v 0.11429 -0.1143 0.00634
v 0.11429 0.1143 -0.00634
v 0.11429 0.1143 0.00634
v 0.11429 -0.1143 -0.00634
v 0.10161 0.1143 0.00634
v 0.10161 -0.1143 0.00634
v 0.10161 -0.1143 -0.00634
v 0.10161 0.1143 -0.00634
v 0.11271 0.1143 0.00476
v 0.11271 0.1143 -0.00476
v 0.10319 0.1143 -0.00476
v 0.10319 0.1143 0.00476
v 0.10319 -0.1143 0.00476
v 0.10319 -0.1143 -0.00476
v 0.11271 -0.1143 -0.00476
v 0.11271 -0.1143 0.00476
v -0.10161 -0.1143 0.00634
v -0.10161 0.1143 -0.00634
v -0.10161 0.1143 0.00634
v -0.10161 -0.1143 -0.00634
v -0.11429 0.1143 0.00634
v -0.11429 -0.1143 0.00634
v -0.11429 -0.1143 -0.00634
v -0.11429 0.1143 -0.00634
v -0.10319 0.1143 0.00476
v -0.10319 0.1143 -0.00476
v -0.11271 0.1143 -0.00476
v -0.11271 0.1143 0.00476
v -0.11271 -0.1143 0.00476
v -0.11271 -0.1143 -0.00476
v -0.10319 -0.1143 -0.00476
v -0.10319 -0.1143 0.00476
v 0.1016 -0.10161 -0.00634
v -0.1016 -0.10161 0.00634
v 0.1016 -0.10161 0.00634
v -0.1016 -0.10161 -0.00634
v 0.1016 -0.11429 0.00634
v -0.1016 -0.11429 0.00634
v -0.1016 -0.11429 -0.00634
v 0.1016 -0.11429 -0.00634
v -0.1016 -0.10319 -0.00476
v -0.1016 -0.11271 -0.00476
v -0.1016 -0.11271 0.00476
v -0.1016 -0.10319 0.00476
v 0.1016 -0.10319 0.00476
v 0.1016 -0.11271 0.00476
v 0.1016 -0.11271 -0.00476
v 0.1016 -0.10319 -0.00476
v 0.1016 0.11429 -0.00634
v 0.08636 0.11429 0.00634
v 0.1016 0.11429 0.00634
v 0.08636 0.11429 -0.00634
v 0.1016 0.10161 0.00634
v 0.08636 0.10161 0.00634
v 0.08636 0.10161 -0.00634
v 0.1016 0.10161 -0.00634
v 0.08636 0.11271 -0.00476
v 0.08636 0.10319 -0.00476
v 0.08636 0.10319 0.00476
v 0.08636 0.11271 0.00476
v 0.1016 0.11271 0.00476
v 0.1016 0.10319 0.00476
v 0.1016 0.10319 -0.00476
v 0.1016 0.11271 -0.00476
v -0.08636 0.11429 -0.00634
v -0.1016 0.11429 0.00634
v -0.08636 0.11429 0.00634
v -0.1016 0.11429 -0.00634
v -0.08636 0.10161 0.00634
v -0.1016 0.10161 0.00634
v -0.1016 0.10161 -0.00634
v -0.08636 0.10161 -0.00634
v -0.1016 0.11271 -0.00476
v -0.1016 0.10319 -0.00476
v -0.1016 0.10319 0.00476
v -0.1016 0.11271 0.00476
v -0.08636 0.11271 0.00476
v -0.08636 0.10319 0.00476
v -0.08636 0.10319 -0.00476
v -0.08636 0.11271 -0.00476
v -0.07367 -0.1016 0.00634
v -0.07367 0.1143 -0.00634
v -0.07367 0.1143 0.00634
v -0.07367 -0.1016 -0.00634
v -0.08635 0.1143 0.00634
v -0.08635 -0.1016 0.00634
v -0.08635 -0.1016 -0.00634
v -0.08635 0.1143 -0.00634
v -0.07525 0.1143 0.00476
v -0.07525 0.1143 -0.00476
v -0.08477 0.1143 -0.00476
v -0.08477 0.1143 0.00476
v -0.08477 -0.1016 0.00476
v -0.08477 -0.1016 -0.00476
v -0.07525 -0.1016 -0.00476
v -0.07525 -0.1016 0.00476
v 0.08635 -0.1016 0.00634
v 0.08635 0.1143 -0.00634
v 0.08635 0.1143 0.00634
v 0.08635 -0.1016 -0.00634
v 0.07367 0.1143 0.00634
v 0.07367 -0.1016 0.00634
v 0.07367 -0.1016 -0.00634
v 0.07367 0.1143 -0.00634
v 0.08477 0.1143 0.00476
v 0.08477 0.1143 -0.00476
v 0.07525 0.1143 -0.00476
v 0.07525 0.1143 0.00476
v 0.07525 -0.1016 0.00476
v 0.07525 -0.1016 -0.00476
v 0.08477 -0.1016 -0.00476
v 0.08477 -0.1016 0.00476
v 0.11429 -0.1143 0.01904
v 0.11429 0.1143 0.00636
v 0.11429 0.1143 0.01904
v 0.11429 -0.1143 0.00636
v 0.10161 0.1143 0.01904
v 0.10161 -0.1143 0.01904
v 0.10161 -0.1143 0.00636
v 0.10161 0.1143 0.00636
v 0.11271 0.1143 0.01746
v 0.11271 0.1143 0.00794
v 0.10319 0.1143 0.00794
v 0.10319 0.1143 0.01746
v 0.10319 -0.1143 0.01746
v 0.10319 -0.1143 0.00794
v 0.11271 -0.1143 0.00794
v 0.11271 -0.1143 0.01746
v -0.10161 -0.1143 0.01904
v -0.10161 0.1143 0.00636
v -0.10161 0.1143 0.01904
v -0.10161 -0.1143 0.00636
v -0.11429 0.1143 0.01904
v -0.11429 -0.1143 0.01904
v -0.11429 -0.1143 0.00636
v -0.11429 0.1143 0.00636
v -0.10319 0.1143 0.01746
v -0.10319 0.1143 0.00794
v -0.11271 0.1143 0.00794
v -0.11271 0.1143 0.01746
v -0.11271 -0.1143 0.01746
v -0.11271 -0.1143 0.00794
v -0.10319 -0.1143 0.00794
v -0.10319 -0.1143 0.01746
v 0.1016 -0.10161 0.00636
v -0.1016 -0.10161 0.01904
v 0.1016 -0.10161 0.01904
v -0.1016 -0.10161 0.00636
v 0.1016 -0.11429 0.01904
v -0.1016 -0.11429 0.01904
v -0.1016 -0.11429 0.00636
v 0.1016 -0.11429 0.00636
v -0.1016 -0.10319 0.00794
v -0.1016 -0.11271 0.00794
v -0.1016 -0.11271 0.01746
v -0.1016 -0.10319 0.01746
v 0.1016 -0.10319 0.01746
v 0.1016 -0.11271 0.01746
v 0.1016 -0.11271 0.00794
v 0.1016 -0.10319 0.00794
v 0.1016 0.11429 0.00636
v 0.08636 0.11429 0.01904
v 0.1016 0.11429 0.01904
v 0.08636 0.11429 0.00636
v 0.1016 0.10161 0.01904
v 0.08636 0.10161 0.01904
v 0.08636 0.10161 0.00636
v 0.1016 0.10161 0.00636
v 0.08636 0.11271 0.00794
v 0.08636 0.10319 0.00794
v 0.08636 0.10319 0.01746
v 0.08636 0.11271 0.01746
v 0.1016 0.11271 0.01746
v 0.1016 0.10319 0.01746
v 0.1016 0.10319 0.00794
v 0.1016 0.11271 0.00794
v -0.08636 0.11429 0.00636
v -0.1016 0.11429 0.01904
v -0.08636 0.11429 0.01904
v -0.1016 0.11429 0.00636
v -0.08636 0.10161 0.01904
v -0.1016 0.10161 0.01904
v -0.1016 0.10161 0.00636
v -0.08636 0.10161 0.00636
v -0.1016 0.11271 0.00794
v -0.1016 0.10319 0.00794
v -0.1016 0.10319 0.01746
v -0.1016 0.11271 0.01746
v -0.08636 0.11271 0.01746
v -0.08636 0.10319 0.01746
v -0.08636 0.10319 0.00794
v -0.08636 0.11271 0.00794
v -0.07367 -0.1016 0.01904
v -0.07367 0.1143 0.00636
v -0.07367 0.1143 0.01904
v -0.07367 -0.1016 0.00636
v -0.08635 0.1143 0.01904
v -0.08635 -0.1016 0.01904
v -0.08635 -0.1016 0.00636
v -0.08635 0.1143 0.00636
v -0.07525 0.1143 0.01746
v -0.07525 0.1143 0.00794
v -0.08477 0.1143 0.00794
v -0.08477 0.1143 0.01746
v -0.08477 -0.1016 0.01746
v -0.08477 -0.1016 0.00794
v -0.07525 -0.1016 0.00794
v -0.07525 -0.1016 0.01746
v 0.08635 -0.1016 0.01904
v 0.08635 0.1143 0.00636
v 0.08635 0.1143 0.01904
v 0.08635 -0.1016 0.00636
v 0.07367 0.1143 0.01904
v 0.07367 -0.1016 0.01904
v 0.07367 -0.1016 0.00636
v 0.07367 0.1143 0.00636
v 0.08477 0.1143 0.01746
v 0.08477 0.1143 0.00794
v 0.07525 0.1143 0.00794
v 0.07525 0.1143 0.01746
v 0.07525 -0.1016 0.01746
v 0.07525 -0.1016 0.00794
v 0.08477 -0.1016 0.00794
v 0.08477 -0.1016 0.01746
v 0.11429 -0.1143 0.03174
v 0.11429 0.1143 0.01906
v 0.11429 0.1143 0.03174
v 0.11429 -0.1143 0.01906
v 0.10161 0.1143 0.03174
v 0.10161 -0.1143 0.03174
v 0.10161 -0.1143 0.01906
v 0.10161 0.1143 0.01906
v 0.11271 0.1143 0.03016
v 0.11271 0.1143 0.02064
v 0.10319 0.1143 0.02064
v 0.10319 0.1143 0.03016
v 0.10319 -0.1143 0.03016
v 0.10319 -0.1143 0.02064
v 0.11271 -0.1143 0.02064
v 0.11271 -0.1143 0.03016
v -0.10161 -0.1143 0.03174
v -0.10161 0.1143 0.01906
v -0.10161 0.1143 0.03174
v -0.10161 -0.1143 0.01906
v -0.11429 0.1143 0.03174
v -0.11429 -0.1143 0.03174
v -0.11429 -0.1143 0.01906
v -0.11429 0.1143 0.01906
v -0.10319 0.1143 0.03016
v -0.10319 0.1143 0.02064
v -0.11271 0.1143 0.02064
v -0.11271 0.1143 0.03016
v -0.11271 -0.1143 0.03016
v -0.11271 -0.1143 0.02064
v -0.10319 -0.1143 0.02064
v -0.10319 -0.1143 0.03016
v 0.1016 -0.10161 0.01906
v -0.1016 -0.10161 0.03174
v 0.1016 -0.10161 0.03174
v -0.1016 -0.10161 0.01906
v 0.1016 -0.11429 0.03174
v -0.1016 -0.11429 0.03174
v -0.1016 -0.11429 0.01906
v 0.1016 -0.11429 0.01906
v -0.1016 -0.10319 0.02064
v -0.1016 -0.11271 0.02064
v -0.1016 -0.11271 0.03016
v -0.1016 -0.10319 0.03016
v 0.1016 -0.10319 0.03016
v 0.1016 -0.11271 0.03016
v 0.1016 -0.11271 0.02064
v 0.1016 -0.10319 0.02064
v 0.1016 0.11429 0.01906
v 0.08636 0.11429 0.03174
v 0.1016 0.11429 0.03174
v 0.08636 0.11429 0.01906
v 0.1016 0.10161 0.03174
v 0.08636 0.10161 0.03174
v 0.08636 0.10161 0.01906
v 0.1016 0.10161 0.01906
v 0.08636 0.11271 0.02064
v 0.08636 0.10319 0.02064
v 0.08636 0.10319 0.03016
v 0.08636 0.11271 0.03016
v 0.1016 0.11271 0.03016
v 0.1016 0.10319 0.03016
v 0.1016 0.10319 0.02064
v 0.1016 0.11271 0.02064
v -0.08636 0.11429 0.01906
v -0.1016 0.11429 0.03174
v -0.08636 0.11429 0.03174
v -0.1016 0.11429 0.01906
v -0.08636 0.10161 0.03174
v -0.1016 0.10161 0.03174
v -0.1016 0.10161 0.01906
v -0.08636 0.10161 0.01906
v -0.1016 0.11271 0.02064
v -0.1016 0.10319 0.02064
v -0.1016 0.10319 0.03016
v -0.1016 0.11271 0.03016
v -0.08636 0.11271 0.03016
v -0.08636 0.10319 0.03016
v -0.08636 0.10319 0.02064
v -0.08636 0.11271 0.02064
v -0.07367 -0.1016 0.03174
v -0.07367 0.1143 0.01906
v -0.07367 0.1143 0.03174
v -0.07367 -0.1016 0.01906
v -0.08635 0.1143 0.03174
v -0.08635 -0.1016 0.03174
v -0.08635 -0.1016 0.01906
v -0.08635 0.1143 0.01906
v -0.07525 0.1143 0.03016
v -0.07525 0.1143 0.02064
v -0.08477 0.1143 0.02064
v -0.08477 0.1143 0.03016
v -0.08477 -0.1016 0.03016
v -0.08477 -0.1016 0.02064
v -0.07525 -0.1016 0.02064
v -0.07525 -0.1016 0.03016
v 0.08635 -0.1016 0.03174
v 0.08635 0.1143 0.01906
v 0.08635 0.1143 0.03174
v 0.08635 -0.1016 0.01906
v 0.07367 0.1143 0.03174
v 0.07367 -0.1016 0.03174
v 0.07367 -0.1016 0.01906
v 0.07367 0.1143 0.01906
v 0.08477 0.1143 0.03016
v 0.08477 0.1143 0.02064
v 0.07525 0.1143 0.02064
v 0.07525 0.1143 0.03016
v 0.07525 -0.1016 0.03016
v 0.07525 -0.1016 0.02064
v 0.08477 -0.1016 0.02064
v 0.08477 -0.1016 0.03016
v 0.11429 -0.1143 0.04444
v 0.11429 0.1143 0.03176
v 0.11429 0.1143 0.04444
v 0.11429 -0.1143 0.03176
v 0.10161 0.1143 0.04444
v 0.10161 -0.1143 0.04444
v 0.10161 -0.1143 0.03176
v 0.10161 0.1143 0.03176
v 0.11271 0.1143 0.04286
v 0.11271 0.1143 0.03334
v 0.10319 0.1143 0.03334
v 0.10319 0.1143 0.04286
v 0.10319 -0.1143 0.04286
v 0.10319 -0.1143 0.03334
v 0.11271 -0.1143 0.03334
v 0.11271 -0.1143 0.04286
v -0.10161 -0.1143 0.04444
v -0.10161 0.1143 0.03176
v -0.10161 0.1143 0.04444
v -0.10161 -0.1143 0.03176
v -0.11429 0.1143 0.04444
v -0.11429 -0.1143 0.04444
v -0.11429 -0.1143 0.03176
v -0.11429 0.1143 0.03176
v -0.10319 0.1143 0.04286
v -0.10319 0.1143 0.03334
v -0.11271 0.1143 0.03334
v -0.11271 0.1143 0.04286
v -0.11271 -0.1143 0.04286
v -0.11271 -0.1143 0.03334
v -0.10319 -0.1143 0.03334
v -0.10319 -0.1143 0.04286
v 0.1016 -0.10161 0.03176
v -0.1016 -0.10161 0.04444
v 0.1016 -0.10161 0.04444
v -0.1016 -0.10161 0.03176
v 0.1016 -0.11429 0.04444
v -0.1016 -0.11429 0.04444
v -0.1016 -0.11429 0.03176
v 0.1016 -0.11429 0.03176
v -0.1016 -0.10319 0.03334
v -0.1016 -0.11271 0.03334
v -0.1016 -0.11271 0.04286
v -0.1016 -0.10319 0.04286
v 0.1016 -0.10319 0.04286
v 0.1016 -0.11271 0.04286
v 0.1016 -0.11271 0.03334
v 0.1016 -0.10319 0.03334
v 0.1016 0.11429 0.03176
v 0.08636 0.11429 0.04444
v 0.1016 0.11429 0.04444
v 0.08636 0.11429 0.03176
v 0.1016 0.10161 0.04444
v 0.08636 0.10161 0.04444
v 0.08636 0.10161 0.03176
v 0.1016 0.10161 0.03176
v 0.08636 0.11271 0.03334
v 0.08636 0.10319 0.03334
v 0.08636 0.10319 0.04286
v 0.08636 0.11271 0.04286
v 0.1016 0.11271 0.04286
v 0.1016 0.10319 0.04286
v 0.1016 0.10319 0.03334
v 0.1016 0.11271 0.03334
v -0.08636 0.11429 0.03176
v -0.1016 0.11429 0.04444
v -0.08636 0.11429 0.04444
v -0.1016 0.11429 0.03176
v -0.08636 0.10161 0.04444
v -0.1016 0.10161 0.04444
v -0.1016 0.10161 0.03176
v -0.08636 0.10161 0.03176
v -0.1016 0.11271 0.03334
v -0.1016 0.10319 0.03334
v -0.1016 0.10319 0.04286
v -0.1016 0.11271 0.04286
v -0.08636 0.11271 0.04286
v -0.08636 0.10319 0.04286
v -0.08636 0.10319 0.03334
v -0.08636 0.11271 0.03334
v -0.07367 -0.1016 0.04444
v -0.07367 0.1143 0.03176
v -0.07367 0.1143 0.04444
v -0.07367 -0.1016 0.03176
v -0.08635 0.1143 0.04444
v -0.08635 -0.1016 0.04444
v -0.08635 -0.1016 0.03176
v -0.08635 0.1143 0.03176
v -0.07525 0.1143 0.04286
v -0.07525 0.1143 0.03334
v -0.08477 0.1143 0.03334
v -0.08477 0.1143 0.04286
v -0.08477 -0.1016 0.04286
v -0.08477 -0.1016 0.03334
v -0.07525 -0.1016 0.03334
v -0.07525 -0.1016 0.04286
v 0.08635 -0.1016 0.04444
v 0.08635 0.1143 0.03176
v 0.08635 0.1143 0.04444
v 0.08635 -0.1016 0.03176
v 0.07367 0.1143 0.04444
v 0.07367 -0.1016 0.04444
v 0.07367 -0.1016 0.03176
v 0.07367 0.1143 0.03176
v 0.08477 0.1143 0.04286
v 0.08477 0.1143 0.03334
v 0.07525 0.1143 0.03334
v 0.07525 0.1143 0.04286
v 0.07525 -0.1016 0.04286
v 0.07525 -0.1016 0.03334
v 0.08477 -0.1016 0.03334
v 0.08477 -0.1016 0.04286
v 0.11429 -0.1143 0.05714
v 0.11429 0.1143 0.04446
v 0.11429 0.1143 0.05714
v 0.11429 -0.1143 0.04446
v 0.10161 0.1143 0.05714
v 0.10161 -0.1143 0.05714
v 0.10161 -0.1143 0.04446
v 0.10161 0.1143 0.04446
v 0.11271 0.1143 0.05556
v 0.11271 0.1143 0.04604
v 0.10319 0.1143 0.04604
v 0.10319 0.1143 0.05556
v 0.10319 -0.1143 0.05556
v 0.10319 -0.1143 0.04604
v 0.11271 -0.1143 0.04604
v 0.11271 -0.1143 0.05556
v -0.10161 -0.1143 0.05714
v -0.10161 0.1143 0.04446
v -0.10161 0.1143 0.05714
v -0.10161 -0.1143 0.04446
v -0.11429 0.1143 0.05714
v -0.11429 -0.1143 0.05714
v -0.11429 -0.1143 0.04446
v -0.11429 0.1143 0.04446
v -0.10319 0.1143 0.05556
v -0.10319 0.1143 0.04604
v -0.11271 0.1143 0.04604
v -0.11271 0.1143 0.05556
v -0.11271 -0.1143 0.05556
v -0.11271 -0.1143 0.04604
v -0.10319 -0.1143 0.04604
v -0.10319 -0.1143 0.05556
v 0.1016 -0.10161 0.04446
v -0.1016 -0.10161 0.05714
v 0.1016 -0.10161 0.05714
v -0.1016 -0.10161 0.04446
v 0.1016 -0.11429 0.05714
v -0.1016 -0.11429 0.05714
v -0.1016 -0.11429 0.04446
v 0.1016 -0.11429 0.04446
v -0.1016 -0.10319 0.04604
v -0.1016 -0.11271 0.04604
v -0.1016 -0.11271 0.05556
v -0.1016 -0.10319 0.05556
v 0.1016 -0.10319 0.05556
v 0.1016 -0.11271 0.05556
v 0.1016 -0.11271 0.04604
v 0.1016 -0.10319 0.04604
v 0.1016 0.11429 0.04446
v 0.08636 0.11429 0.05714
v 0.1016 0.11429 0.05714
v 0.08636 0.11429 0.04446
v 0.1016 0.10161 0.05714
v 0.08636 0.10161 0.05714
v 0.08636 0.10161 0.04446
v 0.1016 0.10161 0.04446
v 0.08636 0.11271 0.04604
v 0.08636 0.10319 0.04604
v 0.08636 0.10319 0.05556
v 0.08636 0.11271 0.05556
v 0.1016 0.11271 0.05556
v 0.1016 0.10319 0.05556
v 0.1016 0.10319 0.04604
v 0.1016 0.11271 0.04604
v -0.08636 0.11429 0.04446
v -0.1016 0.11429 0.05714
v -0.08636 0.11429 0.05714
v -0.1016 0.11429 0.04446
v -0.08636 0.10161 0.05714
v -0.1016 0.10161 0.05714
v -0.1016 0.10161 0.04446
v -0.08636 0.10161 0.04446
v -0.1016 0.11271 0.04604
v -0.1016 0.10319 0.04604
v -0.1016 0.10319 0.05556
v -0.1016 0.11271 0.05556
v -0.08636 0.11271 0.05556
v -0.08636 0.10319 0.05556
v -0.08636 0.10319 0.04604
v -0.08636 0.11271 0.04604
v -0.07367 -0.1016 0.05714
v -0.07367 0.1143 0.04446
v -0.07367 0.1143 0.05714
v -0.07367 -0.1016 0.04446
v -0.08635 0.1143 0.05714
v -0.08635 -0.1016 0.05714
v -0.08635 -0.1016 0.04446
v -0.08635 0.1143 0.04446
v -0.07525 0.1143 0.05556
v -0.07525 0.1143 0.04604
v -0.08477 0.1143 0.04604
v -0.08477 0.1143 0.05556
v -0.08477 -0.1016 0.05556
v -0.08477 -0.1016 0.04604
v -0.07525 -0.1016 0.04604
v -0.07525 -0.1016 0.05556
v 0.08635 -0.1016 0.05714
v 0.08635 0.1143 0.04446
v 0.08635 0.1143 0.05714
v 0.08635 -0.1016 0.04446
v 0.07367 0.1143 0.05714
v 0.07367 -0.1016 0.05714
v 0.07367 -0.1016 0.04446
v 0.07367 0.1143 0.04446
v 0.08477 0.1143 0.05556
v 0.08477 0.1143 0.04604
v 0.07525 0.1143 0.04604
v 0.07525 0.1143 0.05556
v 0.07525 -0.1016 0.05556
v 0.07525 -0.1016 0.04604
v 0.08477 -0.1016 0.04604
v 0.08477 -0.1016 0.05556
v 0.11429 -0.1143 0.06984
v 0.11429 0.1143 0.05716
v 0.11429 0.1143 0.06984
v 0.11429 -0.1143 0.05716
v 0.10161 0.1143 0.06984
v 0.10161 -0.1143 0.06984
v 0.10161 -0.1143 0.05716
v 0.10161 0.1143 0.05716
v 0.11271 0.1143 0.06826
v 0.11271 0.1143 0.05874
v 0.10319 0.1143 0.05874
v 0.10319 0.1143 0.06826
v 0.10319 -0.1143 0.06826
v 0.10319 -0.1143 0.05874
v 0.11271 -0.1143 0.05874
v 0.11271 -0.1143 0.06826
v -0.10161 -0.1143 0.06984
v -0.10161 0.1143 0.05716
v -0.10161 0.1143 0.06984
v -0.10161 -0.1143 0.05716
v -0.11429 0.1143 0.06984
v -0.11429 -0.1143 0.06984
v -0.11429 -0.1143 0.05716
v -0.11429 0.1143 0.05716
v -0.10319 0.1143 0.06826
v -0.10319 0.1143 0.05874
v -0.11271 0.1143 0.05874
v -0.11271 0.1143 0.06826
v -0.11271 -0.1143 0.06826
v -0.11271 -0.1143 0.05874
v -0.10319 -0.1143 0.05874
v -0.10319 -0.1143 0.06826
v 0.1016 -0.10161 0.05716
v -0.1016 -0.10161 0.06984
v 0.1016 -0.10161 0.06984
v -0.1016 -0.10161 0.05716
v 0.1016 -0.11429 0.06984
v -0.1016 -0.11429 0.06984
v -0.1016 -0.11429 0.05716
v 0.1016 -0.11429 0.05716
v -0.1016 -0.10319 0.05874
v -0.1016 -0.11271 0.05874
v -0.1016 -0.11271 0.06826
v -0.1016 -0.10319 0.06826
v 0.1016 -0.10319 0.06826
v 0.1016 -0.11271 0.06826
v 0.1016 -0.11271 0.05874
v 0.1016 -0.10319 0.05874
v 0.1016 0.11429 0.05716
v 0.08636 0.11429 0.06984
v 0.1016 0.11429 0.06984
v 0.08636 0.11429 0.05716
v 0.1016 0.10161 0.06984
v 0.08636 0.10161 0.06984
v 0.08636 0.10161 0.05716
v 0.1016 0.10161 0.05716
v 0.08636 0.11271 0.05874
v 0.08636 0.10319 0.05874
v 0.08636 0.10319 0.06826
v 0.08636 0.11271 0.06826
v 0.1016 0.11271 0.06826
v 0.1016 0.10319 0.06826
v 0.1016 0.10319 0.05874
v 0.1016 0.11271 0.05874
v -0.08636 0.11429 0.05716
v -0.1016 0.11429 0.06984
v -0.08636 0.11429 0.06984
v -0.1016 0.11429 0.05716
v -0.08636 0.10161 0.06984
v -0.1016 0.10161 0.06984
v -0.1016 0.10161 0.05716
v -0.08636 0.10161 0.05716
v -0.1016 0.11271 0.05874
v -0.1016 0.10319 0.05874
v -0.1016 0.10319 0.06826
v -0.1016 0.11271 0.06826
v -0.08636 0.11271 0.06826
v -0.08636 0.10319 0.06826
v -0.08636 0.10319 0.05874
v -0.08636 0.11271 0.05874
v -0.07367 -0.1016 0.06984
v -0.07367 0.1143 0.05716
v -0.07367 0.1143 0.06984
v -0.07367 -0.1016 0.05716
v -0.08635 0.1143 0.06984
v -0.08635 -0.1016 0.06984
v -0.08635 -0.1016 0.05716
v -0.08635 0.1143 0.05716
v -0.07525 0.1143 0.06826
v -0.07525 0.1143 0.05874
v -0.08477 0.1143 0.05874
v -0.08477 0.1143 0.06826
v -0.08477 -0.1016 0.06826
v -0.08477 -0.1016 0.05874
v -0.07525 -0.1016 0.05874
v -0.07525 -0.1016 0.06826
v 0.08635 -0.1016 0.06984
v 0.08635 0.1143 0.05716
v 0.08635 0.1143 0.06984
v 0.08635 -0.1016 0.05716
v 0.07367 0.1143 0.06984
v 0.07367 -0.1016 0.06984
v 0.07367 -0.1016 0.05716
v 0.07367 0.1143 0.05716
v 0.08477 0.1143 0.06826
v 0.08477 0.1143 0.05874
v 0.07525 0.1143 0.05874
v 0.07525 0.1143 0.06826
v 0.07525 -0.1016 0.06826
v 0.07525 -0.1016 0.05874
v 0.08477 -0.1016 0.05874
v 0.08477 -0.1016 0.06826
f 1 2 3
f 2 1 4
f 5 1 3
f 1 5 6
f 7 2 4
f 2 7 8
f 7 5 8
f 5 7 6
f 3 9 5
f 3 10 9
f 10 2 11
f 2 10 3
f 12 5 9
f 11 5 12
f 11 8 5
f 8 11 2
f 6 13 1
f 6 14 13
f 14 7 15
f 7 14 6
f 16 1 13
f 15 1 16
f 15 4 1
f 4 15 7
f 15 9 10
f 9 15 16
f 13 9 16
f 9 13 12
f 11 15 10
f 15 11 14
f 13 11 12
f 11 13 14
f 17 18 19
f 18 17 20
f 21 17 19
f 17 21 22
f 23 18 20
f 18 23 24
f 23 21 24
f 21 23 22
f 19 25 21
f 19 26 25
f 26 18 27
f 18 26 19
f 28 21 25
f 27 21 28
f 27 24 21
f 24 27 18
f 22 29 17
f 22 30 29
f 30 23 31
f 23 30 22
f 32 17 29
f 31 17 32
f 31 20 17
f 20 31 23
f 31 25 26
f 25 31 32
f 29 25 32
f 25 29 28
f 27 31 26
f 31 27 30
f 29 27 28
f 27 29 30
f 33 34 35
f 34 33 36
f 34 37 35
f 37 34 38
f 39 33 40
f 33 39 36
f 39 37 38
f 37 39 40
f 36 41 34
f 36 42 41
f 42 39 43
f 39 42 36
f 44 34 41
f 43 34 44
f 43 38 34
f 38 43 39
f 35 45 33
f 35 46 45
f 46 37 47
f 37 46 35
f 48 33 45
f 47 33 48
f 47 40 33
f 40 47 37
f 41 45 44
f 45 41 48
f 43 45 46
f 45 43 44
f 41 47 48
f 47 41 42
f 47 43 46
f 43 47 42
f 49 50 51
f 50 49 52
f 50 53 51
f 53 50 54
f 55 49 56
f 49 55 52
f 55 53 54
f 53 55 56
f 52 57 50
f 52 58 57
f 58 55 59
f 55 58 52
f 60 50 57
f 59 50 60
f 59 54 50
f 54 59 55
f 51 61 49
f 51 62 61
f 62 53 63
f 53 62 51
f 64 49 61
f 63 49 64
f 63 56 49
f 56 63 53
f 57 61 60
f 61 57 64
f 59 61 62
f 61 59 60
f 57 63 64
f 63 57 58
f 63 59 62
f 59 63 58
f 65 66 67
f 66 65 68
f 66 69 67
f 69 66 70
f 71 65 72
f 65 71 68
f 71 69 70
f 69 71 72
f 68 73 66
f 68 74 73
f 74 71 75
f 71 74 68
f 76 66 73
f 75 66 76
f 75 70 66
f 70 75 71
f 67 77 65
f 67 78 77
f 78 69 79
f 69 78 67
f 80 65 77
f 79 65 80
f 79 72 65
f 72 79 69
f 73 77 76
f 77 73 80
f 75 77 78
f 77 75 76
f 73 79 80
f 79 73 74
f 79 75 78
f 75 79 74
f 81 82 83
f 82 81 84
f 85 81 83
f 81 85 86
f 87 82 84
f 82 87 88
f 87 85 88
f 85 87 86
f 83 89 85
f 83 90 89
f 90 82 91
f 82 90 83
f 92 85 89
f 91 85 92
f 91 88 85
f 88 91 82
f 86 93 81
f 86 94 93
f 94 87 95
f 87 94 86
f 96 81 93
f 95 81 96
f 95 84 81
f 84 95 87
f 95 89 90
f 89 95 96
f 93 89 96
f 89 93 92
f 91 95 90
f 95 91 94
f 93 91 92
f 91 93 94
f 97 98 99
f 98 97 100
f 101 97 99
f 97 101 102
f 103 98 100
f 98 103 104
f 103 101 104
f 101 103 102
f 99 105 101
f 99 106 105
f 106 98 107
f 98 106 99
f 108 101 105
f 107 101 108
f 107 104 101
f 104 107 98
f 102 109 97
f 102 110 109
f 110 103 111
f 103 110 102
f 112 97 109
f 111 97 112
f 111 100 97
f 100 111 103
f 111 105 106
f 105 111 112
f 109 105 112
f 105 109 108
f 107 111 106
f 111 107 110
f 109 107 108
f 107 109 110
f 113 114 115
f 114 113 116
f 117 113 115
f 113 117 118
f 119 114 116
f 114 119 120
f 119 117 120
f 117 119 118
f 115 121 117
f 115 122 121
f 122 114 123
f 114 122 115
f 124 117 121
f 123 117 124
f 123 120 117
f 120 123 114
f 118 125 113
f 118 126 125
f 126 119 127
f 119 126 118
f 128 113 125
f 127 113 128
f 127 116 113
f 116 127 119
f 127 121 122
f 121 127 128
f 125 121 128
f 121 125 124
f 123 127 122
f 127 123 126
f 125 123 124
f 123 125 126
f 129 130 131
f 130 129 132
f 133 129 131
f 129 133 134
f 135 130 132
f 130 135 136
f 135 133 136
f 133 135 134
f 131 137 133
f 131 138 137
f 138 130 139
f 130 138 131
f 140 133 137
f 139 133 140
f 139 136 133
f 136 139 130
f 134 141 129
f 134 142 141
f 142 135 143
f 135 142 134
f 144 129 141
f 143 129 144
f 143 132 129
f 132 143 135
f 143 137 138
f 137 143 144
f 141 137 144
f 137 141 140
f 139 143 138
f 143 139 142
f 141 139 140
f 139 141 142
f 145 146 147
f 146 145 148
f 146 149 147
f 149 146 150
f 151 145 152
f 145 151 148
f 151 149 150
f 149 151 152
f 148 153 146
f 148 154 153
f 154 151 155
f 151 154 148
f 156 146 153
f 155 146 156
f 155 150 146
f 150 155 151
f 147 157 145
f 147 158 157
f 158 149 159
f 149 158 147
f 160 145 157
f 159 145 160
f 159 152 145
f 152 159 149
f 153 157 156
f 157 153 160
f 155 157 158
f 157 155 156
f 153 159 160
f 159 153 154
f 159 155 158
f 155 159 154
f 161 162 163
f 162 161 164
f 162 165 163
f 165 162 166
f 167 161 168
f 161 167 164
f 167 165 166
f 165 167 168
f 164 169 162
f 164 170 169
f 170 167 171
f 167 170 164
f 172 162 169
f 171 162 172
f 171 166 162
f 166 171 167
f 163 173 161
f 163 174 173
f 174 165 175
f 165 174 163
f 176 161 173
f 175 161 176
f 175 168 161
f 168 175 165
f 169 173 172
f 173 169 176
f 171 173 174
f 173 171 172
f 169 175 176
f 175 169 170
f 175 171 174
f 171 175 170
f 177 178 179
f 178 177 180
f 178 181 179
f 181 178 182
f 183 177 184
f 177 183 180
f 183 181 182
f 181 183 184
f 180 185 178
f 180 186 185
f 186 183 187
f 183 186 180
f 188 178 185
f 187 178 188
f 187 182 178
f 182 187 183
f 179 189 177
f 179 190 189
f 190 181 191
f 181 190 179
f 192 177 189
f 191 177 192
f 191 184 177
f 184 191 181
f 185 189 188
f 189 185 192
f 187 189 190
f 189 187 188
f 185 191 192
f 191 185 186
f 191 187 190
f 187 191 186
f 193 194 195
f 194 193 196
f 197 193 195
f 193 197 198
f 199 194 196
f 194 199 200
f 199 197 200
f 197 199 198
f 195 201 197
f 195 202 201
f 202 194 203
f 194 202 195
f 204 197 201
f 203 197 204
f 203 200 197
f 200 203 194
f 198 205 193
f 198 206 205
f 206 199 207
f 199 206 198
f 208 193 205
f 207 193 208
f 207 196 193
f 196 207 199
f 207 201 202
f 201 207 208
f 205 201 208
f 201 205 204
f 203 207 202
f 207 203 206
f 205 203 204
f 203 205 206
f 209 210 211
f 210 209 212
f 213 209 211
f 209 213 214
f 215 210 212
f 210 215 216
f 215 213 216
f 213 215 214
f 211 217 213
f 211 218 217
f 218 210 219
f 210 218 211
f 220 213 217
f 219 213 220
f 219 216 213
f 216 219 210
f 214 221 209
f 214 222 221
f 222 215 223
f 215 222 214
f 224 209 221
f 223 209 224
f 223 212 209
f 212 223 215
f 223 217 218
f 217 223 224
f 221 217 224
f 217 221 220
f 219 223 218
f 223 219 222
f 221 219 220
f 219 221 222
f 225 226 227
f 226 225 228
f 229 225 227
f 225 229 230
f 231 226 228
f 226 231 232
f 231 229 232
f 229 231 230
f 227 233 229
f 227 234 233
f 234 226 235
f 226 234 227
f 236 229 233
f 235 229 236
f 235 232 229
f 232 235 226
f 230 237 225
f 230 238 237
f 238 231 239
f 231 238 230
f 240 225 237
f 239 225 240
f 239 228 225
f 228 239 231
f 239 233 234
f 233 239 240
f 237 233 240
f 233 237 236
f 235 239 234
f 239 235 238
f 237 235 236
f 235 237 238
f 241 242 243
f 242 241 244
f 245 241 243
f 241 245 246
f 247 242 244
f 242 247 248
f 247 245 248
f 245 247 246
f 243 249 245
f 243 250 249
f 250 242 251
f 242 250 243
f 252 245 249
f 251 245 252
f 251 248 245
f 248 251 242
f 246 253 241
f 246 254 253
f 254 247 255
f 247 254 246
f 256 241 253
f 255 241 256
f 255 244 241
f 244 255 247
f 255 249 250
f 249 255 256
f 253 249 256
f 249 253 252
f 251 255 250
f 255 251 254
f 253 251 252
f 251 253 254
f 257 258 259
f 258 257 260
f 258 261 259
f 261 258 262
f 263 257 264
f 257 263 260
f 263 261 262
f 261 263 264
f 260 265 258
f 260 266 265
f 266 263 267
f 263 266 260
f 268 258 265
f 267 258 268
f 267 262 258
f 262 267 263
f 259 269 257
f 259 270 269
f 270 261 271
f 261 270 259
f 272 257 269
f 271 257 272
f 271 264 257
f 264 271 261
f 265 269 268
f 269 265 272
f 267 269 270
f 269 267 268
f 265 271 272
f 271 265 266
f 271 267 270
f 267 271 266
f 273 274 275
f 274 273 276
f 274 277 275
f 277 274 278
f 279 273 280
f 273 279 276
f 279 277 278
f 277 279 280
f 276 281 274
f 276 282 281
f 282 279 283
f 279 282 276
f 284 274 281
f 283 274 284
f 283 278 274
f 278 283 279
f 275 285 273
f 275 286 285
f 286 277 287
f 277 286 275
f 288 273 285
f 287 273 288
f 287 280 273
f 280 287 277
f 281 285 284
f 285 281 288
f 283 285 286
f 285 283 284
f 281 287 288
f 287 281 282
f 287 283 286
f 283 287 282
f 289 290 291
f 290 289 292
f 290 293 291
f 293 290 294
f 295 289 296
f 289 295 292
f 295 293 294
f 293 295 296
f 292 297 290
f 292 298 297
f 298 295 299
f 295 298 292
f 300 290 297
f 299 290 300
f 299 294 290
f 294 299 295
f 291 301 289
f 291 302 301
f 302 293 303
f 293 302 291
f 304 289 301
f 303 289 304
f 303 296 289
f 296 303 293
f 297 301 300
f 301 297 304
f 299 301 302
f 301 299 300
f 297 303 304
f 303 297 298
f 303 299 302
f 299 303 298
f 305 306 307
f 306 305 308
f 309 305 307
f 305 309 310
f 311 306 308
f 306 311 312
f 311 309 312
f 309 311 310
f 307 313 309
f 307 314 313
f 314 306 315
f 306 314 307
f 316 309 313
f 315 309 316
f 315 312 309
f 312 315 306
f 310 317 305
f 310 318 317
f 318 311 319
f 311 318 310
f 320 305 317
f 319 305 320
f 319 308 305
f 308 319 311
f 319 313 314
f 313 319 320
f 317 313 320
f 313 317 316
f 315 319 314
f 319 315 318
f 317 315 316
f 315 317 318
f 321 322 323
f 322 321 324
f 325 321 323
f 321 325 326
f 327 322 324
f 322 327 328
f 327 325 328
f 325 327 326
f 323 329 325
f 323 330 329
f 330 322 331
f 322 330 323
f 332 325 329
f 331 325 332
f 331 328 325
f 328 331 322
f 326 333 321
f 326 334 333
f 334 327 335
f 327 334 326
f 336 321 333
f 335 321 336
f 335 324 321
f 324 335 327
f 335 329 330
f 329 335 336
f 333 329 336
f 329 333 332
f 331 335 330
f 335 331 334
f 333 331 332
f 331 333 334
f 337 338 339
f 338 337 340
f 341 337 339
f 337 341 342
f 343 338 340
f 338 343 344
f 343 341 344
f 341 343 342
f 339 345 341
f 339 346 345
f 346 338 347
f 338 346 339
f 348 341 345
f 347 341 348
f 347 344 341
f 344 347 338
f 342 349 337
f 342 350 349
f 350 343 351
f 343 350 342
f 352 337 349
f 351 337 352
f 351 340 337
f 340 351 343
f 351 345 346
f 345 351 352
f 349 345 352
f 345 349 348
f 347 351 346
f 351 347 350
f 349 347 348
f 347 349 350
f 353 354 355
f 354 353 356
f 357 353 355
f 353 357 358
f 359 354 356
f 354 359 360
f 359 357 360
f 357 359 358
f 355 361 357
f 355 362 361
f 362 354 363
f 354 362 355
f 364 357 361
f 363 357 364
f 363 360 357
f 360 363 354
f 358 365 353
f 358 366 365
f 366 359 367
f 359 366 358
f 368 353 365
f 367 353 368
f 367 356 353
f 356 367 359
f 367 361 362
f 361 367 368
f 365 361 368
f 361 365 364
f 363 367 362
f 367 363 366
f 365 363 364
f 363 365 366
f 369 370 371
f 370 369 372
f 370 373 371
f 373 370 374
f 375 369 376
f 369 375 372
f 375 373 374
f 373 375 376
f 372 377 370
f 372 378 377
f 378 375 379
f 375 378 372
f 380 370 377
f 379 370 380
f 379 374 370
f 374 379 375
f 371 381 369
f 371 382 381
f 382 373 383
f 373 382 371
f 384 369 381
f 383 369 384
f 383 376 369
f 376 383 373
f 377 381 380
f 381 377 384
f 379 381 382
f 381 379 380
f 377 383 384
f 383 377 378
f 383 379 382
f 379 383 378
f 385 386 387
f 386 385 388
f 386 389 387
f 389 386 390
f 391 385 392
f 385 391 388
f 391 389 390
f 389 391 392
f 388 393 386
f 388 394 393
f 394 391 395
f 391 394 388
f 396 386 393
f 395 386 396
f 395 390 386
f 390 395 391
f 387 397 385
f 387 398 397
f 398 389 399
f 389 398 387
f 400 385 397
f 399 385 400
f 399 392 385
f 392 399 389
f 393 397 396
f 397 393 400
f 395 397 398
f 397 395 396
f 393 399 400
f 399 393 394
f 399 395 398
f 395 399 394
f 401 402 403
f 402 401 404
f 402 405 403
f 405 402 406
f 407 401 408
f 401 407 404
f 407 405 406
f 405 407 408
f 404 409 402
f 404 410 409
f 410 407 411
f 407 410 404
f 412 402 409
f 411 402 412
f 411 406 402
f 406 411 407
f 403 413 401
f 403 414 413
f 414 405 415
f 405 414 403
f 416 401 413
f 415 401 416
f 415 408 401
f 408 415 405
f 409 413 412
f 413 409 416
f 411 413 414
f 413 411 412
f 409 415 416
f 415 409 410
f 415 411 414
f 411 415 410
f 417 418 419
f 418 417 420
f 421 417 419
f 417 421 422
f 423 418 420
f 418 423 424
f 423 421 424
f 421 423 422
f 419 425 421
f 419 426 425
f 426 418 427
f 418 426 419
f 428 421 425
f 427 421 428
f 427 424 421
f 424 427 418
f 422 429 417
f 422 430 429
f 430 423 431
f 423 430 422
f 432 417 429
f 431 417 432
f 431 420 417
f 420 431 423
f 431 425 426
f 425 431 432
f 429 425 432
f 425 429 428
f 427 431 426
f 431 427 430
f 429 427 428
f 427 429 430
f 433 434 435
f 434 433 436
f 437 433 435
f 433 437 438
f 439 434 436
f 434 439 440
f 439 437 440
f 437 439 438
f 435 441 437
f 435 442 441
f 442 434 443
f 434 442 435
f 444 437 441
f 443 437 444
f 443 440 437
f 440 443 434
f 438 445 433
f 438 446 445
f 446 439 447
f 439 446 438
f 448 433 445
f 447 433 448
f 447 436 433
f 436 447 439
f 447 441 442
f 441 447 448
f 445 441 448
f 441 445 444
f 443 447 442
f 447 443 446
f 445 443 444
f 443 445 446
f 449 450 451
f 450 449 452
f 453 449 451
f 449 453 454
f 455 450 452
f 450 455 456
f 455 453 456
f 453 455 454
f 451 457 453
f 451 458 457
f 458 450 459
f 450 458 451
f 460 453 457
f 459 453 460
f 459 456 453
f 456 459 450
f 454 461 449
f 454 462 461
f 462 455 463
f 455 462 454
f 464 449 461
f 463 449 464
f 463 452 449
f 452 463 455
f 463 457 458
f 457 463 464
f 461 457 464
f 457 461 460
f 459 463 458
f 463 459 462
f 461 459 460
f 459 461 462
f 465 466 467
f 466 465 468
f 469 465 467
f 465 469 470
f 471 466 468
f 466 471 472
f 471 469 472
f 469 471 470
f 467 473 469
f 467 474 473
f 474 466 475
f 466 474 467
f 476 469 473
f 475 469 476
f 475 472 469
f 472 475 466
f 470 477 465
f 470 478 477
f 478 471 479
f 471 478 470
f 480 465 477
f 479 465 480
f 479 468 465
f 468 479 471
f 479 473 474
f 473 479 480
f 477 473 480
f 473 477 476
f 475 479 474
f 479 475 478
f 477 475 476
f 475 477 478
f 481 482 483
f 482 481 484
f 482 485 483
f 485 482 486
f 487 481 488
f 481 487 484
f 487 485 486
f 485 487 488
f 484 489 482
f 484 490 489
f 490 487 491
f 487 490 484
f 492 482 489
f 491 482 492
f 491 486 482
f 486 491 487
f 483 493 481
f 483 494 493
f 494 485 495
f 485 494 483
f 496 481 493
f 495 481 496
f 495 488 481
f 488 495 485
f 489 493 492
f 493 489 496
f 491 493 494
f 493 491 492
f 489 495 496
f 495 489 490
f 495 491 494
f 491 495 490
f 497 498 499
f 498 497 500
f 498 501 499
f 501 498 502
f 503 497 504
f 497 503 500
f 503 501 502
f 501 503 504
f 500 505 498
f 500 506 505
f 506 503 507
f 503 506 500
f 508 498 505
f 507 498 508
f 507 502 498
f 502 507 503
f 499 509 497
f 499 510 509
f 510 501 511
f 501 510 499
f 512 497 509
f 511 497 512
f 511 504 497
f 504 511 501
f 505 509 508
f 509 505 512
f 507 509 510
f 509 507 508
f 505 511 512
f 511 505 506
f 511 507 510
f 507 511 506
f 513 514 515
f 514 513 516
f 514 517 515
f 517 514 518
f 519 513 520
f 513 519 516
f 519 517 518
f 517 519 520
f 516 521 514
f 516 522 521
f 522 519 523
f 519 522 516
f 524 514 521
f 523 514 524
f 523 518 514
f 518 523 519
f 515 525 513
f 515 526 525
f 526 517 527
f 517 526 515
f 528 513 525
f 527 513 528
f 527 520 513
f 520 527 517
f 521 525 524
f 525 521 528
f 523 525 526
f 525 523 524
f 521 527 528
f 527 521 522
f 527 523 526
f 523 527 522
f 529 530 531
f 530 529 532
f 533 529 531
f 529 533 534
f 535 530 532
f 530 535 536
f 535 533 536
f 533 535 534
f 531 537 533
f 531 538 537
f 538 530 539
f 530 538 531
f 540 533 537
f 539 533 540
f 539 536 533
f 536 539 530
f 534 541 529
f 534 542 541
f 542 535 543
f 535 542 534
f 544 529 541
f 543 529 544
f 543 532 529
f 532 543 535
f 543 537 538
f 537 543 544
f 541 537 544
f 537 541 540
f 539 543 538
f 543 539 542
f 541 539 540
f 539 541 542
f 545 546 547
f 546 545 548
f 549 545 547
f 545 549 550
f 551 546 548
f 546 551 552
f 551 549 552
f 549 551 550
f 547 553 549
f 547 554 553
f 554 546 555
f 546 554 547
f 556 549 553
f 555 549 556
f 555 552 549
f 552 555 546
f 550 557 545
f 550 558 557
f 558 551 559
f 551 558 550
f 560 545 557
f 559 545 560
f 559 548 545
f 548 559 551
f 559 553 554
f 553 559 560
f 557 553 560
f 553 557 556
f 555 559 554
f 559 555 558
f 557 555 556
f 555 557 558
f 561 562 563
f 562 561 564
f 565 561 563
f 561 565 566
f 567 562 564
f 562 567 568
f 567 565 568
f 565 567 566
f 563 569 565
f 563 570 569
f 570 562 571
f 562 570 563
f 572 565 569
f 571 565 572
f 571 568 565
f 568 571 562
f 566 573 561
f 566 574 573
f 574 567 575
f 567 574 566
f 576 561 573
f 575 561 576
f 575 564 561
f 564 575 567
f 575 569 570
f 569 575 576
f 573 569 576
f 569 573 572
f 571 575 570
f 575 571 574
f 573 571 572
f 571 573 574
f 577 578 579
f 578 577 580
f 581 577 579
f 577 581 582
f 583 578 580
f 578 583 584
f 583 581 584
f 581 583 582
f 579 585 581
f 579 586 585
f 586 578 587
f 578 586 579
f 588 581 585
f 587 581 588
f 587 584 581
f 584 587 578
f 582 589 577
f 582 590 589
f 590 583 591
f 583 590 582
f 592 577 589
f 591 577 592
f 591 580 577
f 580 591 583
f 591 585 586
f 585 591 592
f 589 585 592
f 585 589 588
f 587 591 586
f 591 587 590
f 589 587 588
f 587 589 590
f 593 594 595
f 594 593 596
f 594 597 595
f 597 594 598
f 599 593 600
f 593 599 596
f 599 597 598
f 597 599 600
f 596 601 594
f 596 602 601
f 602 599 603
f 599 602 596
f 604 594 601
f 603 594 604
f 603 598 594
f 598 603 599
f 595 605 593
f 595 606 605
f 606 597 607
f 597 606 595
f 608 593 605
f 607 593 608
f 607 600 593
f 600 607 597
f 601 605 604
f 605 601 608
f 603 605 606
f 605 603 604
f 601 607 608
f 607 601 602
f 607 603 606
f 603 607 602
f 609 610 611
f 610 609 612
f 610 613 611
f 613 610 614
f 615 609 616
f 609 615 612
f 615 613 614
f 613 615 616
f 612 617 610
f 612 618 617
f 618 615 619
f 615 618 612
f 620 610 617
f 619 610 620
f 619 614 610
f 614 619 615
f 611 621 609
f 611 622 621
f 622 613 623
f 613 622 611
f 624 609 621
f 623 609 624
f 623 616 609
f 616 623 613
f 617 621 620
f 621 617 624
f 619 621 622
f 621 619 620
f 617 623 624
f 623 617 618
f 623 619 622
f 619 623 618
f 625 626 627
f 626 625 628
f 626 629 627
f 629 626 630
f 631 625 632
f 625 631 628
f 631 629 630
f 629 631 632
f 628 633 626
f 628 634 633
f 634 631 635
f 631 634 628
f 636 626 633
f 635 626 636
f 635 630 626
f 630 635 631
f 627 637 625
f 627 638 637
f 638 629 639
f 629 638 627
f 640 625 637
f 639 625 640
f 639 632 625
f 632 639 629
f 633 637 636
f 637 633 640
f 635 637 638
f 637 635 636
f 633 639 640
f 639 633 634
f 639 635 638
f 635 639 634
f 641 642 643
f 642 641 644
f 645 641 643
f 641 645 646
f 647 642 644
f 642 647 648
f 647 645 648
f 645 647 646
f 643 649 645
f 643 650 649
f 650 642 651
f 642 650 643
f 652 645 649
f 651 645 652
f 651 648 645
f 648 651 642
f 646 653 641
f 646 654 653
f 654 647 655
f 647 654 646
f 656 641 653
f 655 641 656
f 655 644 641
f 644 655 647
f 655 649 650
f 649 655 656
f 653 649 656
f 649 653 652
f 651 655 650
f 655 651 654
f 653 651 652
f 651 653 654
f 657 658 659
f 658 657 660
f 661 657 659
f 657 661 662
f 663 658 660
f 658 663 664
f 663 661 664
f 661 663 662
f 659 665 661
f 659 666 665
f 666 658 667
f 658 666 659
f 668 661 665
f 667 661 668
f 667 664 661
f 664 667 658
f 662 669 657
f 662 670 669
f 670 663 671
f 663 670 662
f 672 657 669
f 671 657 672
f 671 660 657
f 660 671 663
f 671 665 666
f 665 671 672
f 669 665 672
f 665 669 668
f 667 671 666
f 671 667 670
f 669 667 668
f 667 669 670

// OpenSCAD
$fn=200;
module tube(sizeO, sizeI, l) {
    difference(){
        cube([sizeO*0.999,l,sizeO*0.999],center=true);
        cube([sizeI,l+0.1,sizeI],center=true);
    }
}
module wheel(){
    rotate([0,90,0]){
        cylinder(r=2.875*2.54/200,h=0.4*2.54/100,center=true);
    }
}
module u(){
    translate([(0.2286/2-0.0254/4),0,0]){
        tube(0.0254/2,0.0254/2-0.003175,0.2286);
    }
    translate([-(0.2286/2-0.0254/4),0,0]){
        tube(0.0254/2,0.0254/2-0.003175,0.2286);
    }
    translate([0,-0.2286/2+0.0254/4,0]){
        rotate([0,0,90]){
                tube(0.0254/2,0.0254/2-0.003175,0.2286-0.0254);
        }
    }
    translate([0.2286/2-0.0254/2-0.6*2.54/200,0.2286/2-0.0254/4,0]){
        rotate([0,0,90]){
            tube(0.0254/2,0.0254/2-0.003175,0.6*2.54/100);
        }
    }
    translate([-(0.2286/2-0.0254/2-0.6*2.54/200),0.2286/2-0.0254/4,0]){
        rotate([0,0,90]){
            tube(0.0254/2,0.0254/2-0.003175,0.6*2.54/100);
        }
    }
    translate([-(0.2286/2-0.0254*3/4-0.6*2.54/100),0.0254/4,0]){
        tube(0.0254/2,0.0254/2-0.003175,0.2286-0.0254/2);
    }
    translate([(0.2286/2-0.0254*3/4-0.6*2.54/100),0.0254/4,0]){
        tube(0.0254/2,0.0254/2-0.003175,0.2286-0.0254/2);
    }
}
for (i=[0:5]){
    translate([0,0,i*0.0254/2]){
            u();
    }
}
*translate([0,0,2.875*2.54/200*5/8]){
    translate([-0.2286/2+0.0254/2+0.6*2.54/200,0.2286/2-2.875*2.54/200-0.0254/2-0.2*2.54/100,0]){
        wheel();
    }
    translate([-0.2286/2+0.0254/2+0.6*2.54/200,-(0.2286/2-2.875*2.54/200-0.0254/2-0.2*2.54/100),0]){
        wheel();
    }
    translate([0.2286/2-0.0254/2-0.6*2.54/200,0.2286/2-2.875*2.54/200-0.0254/2-0.2*2.54/100,0]){
        wheel();
    }
    translate([0.2286/2-0.0254/2-0.6*2.54/200,-(0.2286/2-2.875*2.54/200-0.0254/2-0.2*2.54/100),0]){
        wheel();
    }
}
